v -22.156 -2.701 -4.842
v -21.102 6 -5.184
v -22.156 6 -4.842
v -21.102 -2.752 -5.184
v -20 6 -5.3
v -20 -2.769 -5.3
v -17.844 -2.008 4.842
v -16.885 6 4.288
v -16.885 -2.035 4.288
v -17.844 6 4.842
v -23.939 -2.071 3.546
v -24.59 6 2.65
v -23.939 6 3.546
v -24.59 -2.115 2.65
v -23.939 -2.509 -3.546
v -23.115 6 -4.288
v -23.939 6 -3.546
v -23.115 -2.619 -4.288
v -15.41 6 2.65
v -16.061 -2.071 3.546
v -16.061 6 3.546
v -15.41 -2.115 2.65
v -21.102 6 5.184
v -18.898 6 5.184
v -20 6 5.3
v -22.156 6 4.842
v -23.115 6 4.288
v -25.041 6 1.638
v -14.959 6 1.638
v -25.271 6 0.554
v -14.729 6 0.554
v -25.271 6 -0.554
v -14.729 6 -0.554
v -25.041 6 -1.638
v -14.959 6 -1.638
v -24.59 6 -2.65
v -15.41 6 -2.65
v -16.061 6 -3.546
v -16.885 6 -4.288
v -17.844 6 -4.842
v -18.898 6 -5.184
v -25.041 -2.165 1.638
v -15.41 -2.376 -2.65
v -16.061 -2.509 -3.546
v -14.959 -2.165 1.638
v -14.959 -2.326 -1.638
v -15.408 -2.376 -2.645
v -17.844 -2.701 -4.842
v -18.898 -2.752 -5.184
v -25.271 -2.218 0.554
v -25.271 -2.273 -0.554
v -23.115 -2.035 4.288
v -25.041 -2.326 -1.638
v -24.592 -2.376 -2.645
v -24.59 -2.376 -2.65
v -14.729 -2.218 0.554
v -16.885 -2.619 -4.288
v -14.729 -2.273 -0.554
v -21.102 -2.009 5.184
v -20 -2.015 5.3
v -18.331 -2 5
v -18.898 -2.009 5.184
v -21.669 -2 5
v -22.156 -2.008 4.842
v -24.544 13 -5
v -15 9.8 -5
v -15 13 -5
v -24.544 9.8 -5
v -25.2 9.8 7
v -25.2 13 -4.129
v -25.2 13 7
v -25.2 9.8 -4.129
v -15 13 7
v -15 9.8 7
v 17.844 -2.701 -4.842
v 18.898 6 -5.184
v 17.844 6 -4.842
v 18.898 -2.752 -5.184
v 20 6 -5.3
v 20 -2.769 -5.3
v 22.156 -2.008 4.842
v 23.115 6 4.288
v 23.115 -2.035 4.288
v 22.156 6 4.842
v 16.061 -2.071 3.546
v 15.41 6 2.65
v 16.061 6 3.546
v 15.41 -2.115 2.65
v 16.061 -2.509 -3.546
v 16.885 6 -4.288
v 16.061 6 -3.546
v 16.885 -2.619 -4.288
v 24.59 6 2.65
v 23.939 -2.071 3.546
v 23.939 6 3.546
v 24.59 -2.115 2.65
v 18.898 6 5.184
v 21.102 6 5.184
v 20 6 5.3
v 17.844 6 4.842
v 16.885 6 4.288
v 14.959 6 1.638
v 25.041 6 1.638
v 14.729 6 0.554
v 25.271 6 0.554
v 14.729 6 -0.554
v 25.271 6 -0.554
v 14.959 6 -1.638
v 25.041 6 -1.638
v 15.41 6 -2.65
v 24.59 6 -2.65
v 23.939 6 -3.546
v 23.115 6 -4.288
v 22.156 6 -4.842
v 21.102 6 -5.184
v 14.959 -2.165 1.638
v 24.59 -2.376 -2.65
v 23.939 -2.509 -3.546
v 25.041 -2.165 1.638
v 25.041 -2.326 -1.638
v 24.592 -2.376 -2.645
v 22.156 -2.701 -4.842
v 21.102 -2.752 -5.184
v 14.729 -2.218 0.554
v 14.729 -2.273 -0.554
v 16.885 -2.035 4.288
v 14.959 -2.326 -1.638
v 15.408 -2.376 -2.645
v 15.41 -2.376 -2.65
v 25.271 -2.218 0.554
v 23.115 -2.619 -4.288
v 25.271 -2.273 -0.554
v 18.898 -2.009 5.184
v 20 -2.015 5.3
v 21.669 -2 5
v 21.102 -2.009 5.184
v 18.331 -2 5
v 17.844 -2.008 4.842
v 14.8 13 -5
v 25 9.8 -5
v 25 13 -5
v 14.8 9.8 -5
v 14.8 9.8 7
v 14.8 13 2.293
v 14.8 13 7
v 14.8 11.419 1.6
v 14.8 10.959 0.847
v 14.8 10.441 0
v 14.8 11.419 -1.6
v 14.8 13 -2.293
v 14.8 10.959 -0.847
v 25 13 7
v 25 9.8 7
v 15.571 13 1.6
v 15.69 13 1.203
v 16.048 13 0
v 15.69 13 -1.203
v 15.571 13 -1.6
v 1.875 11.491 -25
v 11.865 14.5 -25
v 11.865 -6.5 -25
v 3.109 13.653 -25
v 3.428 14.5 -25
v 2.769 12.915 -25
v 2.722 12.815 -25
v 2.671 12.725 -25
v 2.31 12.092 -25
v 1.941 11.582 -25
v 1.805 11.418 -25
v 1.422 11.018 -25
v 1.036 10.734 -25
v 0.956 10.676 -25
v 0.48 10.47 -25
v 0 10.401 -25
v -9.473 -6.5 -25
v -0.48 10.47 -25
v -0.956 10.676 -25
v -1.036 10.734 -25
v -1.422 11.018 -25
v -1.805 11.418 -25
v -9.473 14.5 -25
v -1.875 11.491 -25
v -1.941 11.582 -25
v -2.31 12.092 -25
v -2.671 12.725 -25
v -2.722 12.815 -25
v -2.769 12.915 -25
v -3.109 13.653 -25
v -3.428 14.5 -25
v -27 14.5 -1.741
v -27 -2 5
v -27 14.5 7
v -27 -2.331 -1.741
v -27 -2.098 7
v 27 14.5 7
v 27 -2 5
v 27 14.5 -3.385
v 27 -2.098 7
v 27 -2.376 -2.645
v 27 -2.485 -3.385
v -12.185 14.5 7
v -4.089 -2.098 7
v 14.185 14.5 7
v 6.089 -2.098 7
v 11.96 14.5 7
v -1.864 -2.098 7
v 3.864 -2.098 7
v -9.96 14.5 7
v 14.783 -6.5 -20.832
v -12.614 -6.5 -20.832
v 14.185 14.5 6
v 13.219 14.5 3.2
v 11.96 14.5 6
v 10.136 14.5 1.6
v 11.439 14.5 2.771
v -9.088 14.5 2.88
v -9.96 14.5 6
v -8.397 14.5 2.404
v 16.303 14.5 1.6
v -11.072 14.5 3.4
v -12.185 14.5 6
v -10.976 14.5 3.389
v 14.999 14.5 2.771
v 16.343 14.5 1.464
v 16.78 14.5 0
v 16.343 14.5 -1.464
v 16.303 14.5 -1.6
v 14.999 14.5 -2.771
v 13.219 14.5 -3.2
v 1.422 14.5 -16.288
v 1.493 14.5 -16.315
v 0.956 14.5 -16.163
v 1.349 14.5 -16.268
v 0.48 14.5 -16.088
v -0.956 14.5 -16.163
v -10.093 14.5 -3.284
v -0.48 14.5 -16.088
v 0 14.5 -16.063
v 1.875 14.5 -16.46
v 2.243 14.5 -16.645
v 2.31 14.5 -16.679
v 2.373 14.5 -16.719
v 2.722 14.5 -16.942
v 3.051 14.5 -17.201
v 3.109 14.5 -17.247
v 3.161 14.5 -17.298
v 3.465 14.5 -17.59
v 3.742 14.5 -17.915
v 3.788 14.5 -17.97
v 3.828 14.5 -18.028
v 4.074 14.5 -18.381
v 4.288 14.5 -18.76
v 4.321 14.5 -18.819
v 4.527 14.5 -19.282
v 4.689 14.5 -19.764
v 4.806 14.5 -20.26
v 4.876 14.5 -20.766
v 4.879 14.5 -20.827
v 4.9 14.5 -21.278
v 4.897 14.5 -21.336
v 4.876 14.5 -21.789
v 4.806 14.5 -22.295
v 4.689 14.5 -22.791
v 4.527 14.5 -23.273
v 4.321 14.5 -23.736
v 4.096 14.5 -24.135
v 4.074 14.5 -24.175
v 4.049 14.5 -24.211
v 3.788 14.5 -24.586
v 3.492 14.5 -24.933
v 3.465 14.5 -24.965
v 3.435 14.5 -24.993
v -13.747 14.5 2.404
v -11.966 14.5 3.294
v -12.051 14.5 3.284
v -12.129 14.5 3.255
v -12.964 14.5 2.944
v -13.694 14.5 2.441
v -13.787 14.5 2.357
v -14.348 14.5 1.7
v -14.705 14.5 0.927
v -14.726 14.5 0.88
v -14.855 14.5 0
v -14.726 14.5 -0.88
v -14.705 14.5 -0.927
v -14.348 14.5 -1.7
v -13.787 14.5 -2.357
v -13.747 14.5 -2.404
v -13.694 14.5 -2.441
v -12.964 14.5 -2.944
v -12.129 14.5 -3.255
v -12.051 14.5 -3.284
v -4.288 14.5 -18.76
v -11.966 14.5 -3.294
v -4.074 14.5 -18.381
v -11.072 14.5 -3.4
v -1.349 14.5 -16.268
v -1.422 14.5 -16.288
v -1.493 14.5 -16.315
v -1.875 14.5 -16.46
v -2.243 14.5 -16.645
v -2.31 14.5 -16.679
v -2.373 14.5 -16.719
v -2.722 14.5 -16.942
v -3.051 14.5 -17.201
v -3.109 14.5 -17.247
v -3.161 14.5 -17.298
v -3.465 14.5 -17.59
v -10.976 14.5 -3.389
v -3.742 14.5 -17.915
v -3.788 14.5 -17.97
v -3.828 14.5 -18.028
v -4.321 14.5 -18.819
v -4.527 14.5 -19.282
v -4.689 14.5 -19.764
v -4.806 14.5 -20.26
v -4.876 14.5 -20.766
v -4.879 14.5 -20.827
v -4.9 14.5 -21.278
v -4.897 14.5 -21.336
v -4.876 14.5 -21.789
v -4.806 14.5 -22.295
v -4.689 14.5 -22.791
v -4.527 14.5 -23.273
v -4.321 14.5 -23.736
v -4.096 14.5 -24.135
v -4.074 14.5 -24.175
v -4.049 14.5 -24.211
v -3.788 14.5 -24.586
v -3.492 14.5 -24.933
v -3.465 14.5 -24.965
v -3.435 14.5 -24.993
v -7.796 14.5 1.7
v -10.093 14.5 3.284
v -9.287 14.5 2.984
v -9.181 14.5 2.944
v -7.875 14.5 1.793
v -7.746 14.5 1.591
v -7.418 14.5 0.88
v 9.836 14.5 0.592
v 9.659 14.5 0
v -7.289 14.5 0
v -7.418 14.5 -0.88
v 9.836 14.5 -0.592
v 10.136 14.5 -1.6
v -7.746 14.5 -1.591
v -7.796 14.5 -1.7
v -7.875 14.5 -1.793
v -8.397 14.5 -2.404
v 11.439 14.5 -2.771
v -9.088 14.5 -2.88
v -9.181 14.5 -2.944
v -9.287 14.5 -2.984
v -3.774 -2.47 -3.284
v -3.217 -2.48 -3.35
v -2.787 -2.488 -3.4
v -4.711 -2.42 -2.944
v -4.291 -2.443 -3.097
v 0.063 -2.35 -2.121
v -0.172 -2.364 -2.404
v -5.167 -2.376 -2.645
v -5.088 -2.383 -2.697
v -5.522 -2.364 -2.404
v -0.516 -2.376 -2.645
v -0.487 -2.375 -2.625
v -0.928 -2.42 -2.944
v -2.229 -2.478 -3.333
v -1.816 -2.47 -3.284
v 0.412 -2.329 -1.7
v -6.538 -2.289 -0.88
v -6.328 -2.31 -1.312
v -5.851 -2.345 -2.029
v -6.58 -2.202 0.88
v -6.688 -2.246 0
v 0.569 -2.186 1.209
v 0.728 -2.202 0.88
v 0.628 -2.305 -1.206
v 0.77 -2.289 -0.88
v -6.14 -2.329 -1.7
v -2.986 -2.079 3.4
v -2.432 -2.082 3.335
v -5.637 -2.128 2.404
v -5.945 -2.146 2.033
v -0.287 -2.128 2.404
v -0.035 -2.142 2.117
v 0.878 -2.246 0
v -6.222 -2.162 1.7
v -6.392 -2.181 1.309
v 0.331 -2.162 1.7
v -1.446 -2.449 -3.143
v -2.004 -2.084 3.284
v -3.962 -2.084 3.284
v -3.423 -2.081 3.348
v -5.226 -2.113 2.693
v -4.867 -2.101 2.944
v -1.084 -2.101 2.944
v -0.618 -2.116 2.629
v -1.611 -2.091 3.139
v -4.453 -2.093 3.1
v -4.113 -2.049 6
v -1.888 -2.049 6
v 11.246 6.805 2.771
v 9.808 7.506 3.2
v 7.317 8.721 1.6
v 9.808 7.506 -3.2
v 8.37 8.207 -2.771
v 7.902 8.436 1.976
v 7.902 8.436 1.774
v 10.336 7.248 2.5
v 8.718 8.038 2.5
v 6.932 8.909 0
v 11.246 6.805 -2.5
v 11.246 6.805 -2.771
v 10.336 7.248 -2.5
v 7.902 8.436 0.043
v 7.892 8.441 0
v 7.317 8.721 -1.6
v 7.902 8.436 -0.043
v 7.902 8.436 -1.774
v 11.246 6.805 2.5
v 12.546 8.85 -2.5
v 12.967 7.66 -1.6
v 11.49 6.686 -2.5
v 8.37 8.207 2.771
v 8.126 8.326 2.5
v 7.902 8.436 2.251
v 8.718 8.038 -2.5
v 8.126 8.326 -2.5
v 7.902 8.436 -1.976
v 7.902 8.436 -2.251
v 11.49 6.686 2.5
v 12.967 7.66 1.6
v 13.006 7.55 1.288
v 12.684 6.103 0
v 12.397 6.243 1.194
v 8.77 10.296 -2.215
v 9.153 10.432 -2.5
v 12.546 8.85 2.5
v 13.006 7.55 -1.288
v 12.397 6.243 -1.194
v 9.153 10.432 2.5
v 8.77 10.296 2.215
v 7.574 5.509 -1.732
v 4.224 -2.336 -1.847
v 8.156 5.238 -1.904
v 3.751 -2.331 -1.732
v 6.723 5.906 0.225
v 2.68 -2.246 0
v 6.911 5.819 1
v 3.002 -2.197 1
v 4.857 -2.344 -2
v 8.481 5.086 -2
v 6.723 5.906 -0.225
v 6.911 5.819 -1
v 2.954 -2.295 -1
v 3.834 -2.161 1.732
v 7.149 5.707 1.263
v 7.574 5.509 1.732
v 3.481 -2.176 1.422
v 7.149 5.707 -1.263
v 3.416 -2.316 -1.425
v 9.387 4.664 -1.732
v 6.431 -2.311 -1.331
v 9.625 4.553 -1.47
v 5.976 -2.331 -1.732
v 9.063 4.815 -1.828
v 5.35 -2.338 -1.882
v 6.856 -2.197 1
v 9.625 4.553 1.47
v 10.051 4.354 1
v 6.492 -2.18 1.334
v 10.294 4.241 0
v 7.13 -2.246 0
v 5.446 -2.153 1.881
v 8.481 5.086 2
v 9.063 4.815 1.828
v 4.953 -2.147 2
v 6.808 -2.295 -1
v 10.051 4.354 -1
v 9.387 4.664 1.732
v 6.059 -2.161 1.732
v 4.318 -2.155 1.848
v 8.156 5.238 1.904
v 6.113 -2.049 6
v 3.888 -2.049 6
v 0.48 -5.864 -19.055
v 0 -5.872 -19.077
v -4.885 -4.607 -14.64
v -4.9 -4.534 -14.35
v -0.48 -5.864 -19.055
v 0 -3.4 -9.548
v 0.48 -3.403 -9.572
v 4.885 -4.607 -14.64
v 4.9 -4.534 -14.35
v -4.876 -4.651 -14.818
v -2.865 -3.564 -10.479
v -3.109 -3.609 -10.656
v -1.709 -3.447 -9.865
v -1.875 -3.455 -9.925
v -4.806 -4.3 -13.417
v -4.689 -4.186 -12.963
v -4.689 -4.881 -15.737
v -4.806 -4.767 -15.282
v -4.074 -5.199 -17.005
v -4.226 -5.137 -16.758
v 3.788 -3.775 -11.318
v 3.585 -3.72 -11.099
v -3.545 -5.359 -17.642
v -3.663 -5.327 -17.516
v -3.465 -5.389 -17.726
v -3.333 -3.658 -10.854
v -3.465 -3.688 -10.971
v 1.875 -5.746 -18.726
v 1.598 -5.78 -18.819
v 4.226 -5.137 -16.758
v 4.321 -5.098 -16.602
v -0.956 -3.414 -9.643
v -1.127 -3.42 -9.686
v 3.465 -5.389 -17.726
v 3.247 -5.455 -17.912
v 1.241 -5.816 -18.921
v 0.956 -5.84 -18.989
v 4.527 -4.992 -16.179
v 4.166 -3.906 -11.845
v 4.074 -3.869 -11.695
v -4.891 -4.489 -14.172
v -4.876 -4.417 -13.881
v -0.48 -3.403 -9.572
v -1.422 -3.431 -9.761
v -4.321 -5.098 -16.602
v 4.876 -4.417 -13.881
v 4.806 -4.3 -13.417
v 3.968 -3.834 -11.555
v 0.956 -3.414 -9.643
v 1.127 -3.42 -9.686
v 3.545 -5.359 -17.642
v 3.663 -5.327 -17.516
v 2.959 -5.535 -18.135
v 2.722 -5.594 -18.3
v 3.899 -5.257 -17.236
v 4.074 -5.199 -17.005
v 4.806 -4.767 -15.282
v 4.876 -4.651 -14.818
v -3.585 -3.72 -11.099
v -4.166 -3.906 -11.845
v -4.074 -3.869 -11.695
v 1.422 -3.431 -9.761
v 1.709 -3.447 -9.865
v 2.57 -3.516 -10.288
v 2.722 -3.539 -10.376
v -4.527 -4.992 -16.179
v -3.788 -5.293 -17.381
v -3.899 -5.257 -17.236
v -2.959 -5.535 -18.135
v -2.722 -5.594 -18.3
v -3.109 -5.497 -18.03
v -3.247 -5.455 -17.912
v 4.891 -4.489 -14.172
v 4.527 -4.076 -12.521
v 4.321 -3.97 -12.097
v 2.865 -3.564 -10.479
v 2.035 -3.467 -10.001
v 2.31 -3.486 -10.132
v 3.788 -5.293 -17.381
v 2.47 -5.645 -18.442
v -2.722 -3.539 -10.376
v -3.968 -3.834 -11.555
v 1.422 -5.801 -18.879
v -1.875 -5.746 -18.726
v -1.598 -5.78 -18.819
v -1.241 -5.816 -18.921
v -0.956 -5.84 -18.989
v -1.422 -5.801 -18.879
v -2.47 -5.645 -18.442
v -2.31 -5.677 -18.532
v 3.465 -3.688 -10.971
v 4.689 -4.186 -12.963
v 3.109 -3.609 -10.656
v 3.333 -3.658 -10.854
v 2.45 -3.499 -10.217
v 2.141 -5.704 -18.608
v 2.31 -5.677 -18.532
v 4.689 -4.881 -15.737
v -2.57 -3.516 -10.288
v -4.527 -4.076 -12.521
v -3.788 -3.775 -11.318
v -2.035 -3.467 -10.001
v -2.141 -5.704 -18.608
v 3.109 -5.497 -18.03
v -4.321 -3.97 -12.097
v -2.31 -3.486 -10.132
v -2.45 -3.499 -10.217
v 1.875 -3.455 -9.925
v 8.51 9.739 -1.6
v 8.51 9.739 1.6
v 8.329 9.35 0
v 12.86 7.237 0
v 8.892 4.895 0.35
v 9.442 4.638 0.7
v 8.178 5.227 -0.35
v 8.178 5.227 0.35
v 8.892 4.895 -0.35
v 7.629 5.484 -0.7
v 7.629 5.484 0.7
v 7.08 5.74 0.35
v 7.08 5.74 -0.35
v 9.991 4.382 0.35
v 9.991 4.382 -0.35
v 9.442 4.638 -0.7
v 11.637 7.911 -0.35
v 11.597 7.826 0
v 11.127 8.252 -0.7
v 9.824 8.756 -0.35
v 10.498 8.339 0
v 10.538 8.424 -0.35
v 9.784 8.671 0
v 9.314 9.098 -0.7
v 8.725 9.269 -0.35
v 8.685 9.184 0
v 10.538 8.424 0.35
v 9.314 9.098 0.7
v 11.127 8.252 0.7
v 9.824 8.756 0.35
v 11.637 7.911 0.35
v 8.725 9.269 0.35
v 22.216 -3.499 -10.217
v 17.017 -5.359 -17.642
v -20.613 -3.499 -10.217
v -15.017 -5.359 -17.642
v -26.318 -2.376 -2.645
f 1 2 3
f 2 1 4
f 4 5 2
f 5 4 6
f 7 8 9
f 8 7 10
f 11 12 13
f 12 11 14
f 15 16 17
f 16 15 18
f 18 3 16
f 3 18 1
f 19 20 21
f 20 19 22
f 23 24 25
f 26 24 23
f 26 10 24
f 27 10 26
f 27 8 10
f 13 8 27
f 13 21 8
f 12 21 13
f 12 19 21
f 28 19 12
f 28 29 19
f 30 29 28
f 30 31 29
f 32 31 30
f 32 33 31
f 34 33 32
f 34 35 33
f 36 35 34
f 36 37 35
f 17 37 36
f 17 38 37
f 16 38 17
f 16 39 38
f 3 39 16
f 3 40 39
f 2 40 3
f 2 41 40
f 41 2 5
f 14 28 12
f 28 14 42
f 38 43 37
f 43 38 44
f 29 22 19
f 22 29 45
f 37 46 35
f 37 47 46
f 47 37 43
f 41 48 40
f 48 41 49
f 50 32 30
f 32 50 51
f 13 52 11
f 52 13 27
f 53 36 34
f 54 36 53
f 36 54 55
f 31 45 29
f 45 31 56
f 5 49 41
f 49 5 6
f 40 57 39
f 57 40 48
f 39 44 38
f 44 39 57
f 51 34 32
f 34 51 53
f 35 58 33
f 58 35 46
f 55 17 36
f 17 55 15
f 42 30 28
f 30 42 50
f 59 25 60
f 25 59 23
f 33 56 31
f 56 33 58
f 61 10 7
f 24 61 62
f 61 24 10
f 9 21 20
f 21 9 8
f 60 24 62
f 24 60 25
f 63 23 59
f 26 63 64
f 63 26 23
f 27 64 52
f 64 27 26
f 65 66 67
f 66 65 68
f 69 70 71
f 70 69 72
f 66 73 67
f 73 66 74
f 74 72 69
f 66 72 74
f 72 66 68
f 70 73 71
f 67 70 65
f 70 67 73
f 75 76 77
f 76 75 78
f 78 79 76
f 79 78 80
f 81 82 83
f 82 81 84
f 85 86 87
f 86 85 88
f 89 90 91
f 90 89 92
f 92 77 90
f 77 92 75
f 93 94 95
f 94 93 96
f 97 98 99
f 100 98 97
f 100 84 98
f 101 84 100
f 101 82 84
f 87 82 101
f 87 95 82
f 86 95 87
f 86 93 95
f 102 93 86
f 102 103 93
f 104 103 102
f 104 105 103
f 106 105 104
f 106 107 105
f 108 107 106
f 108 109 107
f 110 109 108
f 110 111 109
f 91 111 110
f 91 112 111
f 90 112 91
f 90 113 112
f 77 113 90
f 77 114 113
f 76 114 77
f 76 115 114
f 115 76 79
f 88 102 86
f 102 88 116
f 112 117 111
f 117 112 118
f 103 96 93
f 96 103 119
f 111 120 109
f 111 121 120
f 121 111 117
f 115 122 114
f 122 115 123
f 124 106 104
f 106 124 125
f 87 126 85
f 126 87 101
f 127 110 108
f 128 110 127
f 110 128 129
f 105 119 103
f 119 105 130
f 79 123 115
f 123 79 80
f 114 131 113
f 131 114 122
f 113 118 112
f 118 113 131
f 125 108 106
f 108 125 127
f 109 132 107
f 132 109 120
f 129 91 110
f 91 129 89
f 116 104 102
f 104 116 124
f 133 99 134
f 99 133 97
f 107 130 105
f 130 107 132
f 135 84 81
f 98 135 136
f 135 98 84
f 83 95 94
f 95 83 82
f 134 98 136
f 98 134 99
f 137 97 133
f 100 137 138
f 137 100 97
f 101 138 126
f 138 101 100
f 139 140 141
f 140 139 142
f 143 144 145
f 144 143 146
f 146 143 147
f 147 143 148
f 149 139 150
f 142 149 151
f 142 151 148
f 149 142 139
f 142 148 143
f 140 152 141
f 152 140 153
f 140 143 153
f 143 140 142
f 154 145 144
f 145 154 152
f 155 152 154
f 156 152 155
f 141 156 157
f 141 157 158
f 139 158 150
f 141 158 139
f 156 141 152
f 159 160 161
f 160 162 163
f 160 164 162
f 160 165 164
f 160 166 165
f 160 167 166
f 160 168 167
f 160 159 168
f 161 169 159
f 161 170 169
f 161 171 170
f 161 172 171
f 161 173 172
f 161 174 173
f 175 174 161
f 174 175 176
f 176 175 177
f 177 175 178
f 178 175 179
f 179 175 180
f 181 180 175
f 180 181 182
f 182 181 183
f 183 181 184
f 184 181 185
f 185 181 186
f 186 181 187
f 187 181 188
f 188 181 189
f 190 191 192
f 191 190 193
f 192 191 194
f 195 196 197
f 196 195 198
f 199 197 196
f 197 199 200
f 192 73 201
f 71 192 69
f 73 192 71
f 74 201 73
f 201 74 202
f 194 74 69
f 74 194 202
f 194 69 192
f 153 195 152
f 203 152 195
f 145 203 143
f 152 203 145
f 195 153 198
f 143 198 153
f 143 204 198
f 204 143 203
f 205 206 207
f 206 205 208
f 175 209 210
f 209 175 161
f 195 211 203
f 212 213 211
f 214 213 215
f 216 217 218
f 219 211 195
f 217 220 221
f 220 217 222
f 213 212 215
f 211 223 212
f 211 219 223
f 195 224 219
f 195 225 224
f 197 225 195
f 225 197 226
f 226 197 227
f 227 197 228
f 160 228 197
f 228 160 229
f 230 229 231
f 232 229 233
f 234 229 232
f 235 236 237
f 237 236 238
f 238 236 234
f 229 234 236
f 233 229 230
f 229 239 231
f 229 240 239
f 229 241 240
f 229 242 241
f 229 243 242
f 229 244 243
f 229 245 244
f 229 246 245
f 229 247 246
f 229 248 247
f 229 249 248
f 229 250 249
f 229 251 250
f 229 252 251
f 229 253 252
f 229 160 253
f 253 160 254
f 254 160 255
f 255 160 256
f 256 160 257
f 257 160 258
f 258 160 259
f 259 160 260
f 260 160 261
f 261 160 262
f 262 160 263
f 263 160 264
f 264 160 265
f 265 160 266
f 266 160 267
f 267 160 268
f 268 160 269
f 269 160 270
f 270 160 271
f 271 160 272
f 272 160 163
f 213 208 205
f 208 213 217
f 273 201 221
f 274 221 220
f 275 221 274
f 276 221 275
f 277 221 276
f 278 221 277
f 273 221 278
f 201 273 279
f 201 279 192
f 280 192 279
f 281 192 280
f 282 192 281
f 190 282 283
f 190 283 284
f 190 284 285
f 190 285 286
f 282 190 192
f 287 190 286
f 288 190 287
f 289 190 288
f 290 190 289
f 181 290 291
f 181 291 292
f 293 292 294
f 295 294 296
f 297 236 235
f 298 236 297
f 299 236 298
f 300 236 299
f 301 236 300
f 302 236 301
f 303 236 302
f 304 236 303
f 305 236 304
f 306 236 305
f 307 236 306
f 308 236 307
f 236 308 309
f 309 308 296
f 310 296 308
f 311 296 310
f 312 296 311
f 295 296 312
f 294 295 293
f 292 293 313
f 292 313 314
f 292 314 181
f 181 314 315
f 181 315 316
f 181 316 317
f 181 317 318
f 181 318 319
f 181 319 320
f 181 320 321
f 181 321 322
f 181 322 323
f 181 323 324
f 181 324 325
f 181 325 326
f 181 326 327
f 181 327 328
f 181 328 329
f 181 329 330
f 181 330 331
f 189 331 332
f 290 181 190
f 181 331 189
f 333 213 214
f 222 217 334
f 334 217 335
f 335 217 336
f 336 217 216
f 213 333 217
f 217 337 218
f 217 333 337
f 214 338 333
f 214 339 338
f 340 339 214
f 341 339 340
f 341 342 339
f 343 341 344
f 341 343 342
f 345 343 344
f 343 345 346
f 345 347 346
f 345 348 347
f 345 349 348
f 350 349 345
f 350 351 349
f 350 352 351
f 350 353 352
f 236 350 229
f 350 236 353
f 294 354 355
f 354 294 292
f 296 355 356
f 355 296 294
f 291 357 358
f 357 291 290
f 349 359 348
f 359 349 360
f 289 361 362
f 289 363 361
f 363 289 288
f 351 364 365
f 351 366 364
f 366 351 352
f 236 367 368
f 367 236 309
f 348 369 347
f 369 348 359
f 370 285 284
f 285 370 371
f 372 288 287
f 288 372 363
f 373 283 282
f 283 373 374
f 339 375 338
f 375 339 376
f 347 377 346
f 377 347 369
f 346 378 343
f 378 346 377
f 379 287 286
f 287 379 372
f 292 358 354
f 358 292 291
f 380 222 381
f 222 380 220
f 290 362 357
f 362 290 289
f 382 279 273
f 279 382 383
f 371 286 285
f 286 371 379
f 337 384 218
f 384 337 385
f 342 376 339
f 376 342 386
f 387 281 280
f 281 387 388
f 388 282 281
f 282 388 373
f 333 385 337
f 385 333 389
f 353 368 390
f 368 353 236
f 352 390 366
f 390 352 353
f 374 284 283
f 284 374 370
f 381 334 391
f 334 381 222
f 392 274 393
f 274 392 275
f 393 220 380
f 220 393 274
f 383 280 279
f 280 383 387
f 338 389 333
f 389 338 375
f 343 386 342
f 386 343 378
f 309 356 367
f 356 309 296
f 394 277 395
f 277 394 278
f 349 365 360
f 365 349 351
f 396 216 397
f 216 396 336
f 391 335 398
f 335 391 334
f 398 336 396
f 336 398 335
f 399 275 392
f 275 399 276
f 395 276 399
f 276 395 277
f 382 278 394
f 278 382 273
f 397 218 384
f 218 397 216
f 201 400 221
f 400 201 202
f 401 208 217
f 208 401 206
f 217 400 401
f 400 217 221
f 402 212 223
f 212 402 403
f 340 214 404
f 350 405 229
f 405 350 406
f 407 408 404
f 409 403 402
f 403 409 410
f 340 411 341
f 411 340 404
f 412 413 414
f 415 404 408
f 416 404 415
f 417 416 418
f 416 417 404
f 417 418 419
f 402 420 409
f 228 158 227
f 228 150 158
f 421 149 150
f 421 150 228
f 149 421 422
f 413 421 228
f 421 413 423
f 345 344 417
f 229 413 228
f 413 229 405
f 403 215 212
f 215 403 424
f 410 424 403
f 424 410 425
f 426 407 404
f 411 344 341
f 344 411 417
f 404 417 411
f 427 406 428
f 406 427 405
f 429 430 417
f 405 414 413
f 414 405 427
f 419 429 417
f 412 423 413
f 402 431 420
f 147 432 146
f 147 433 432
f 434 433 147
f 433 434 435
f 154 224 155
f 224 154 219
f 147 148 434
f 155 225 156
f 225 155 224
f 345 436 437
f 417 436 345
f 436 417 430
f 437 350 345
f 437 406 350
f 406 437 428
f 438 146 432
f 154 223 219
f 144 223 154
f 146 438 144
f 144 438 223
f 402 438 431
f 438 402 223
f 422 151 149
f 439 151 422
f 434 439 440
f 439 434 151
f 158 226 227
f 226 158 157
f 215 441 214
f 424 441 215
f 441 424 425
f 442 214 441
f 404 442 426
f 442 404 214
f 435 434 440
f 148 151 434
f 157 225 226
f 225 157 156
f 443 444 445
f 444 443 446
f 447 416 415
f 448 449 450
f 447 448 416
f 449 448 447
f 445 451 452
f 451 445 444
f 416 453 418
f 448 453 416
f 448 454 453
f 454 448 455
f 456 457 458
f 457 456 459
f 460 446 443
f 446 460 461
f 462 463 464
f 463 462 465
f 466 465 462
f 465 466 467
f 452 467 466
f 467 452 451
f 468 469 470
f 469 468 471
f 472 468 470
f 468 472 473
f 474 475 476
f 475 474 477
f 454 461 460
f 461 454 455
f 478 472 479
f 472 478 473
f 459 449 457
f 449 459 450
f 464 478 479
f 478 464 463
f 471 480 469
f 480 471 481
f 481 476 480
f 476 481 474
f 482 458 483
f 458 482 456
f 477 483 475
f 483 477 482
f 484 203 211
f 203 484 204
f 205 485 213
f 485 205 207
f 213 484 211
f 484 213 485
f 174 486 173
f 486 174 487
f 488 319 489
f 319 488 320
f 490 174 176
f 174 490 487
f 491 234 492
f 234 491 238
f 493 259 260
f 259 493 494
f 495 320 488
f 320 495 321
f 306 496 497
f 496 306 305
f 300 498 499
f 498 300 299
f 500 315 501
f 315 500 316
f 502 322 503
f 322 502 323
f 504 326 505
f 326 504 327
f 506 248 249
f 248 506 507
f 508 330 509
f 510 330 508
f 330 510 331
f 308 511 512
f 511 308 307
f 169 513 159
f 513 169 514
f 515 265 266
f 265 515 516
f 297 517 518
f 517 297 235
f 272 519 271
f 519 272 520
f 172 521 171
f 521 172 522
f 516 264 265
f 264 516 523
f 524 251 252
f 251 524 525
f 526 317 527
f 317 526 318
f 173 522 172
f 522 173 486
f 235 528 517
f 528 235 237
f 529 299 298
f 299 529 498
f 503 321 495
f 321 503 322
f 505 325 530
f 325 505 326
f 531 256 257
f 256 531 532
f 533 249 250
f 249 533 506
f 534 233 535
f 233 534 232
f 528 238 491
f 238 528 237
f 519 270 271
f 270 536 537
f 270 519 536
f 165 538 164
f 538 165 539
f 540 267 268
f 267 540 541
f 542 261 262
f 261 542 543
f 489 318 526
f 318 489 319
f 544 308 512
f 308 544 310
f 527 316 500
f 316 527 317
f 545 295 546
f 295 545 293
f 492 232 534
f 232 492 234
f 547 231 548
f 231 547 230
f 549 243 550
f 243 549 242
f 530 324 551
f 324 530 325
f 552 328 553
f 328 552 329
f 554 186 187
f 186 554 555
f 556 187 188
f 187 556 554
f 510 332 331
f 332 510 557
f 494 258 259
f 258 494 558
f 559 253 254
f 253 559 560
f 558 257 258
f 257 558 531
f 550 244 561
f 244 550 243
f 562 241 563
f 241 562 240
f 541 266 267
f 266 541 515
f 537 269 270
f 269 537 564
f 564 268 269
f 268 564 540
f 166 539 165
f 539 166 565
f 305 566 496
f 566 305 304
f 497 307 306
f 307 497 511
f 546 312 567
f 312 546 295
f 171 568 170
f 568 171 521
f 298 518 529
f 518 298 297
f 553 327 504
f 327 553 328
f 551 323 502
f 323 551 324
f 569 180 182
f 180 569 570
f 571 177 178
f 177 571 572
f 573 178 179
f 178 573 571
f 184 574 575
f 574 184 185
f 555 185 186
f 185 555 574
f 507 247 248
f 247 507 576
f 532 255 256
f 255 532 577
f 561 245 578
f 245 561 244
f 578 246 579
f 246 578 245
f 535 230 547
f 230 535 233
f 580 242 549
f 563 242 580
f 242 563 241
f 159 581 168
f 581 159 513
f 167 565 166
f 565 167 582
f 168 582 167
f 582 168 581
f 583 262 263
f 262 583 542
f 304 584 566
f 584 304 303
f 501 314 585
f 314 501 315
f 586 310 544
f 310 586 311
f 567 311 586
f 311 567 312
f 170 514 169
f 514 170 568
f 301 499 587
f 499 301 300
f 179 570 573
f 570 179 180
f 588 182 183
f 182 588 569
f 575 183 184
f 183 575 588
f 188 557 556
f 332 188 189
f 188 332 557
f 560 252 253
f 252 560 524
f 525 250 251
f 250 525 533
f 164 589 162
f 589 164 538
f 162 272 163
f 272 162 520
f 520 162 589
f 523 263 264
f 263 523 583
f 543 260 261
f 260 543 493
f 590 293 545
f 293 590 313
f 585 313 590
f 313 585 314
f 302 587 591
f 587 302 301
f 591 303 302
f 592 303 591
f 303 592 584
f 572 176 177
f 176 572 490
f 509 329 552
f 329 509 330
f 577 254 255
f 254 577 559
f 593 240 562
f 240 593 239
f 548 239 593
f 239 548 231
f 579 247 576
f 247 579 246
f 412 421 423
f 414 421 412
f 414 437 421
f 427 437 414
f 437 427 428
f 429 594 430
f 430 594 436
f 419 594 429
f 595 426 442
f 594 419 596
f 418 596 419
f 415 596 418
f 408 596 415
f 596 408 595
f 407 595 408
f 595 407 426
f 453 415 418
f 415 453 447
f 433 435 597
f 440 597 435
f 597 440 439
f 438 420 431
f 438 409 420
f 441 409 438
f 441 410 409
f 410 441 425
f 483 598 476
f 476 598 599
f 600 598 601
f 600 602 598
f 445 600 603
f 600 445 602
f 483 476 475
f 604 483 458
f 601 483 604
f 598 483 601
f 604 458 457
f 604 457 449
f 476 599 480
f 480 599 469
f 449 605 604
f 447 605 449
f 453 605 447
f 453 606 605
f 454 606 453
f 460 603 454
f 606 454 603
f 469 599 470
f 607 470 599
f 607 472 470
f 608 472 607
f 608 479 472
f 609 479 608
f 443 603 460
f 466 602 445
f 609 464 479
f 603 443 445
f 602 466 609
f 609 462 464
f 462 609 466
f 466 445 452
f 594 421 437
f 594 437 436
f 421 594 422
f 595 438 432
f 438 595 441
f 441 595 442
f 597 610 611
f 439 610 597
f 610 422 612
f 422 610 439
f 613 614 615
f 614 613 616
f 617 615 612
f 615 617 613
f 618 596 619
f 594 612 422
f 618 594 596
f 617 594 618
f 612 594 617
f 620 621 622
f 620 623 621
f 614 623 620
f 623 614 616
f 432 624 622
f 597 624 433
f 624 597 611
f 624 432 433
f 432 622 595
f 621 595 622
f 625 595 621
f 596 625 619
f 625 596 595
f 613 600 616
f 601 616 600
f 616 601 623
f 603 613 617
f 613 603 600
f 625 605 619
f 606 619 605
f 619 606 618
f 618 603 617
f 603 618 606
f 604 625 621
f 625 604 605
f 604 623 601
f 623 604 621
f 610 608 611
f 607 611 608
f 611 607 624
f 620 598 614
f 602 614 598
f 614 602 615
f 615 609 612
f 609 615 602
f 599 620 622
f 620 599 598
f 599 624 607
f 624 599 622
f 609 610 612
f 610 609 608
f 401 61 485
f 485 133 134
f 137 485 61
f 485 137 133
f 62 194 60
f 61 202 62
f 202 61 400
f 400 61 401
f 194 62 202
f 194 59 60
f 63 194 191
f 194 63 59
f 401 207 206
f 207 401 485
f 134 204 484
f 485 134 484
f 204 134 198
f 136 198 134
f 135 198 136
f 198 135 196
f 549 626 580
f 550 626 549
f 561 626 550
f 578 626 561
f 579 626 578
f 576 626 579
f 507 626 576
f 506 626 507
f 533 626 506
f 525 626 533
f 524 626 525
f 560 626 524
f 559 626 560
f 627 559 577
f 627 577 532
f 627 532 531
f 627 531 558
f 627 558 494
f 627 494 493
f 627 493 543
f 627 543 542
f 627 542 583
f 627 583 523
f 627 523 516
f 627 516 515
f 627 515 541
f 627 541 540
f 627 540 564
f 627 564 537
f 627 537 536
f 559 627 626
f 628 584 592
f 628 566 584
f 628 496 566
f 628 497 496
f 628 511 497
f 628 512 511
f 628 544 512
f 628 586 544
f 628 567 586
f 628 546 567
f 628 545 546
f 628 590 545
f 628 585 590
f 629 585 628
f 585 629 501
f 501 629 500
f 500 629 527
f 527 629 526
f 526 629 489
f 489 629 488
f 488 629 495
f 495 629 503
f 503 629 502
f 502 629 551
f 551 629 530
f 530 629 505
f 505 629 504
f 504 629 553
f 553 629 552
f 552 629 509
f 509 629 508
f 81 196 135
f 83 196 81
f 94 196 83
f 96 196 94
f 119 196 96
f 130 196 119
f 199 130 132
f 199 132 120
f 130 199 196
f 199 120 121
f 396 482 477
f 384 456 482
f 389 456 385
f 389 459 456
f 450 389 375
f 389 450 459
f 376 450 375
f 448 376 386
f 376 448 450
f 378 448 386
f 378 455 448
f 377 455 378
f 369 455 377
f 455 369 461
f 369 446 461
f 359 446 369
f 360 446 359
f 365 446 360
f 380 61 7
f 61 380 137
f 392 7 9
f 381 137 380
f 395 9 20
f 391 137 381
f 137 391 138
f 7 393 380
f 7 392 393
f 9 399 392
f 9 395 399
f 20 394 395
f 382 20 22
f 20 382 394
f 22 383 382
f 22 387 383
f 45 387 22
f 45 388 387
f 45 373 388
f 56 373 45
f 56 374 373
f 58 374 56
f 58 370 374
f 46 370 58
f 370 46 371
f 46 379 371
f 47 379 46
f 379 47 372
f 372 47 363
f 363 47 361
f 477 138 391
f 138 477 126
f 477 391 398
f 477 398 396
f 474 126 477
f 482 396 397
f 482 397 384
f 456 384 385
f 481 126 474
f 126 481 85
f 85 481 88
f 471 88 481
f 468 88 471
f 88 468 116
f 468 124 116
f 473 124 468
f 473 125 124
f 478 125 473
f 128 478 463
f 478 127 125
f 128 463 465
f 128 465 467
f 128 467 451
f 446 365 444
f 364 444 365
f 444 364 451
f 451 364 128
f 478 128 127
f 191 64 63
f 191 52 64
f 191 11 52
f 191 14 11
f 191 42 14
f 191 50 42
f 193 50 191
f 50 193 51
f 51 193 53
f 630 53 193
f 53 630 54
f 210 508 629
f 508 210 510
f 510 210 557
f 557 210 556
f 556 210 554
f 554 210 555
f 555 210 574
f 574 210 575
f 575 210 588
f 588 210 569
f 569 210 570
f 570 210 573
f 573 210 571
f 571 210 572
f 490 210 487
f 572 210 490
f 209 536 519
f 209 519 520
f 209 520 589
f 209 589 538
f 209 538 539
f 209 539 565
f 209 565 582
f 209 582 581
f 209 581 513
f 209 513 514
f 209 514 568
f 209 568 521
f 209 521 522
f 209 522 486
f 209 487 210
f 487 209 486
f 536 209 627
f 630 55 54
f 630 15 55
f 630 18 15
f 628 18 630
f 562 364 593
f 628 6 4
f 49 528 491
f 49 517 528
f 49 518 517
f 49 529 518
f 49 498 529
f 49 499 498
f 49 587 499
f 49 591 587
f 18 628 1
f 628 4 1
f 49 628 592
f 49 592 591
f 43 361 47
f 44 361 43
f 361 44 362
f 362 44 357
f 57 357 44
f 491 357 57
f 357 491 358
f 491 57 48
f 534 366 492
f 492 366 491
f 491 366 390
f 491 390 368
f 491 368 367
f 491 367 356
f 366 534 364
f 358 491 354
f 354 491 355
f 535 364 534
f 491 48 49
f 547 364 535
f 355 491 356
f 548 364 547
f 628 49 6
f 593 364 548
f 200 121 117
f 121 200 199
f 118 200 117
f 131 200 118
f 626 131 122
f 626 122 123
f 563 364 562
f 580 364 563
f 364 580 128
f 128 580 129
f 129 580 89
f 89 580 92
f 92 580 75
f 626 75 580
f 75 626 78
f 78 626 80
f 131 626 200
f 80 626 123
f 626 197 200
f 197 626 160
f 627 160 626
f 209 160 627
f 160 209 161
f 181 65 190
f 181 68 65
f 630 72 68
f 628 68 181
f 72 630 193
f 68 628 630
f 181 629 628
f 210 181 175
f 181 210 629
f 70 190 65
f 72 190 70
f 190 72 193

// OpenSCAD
diameter=10;
height=4;
number=3;
distance=5;
baseline=36; 


module maghole(diameter,height,number,back) {
		translate([0,height*(number-2)/2,0])
        rotate([90,0,0])
         cylinder(r=diameter/2,h=height*(2*number-1),center=true);
    if(back == 1) {
		translate([0,-height*2*(number+1)/2,0])
        rotate([90,0,0])
         cylinder(r=diameter/6,h=height*number,center=true);
    }
}

module smaghole(diameter,height,number,back) {
		translate([0,(height*(number-2)/2),0])
        rotate([90,0,0])
         cylinder(r=0.3+diameter/2,h=height*4,center=true,$fs = 0.01);
//         cylinder(r=0.3+diameter/2,h=height*(2*number-1),center=true);

    translate([-9,-13,-5]) cube([4+diameter,3.2,diameter+0.2]);    
   // translate([-1,-15,0]) cube([3,3,10]);
}
module mirror(diameter,height,number,distance,baseline) {
width=diameter+4;
depth=distance+height*number+4;
length=baseline+diameter+8;
mirrorthick = 2.7;
   difference() {
     translate([0,-height,0])
	   cube([width,  // Small dimension
            depth, // Optical path dim
		      length],center=true);
      translate([0,0,2+baseline/2])
             maghole(diameter,height,number,0);
     translate([0,0,-(2+baseline/2)])
             maghole(diameter,height,number,0);
     translate([0,depth/4,0])
          cube([width+2,depth+2,length-2*width],center=true);
    rotate([7,0,0])
     translate([0,0.6-depth/3,0.75])
          cube([width+2,mirrorthick+0.6,length-(2*diameter+4)],center=true);
     }
}

module sensor(diameter,height,number,distance,baseline) {
width=diameter+4;
depth=distance+height*number+4;
length=baseline+diameter+8;
mirrorthick = 2.6;
extra=2*width+4;

   difference() {
     translate([2+width/2,-height,0])
	   cube([extra,  // Small dimension
            depth, // Optical path dim
		      length],center=true);
      translate([0,0,2+baseline/2])
             smaghole(diameter,height,number,1);
     translate([0,0,-(2+baseline/2)])
             smaghole(diameter,height,number,1);
//LASER
     translate([0,0,4])
        rotate([64,0,0])
             cylinder(r=3.4,h=40,center=true,$fn=24);
     translate([-11,0,4])
        rotate([64,0,0]) cube([10,2,40],center=true);
//PhotoTransistor
     translate([0,-12,-12])
        rotate([116,0,0])
             cylinder(r=3.2,h=10,center=true,$fn=12);
     translate([0,0,-6])
        rotate([116,0,0])
             cylinder(r=2,h=40,center=true,$fn=12);
     translate([-11,0,-6])
        rotate([116,0,0]) cube([10,2,40],center=true);
//TEMP SENSOR
     translate([2+width,0,0])
        rotate([90,0,20])
             cylinder(r=4.9,h=40,center=true,$fn=64);

     }
translate([0,-5,-6.3])
rotate([25,0,0])
     difference() {
     translate([0,-4,-2.5])cube([5,6,5],center=true);
     translate([0,-8,0])
        cylinder(r=3.2,h=10,center=true,$fn=12);
     translate([0,0,-1.0])
        rotate([90,0,0])
             cylinder(r=0.7,h=40,center=true,$fn=6);
     translate([0,0,-3])
        rotate([90,0,0])
             cylinder(r=0.7,h=40,center=true,$fn=6);
     }
}

module jarwall() {
  difference() {
     cube([40,40,120],center=true);
	  translate([40,0,0])
	     cylinder(r=50,h=120,center=true,$fn=64);
	   }
}

module jar() {
	  translate([-8,110,-10])
	          cylinder(r=78,h=120,center=true,$fn=64);
}

module powerhole(dim) {
offset = dim+2;
  //  cylinder(r=dim,h=2*dim,center=true,$fn=10);
  //  translate([dim-1.6,0,0])
   //   cylinder(r=dim,h=dim,center=true,$fn=10);
    translate([dim-3,0,0]) cube([2*dim+2,2*dim-1,2*dim-1],center=true);
    translate([-offset,0,0])
      cylinder(r=1.1,h=2*dim,center=true,$fn=10);
    translate([offset+2,0,0])
      cylinder(r=1.1,h=2*dim,center=true,$fn=10);
}

module sensordevice() {
  wall = 32;
  side = 44;
  deep = 50;
  difference() { 
   sensor(diameter,height,number,distance,baseline);
   translate([3,-30,3]) jar();
  }
//  translate([-7,-(wall+30),21]) cube([wall,side+12,3]);

//     translate([-7,-(wall+30),-24])
//         cube([wall,side+12,3]);

//  difference() {
//  translate([23.5,-(wall+7),0])
//    rotate([0,90,0])
//    cube([side,deep,3],center=true);
//     translate([24,-54,12])
//			rotate([0,90,0]) 
//           powerhole(4.5);
//  }
}
module mirrordevice() {
  difference() { 
   mirror(diameter,height,number,distance,baseline);
   translate([0,-3.3,0]) rotate([0,0,-90]) jarwall();
  }
}
  // mirrordevice();

module minimum() {
 difference() {
    rotate([0,90,180]) 
           sensordevice();
   translate([34,0,-30])
     rotate([0,35,0])
      cube([42,42,42],center=true);
   translate([-32,0,-30])
     rotate([0,-37,0])
      cube([42,42,42],center=true);
  }
}
//jarwall();
minimum();



     
